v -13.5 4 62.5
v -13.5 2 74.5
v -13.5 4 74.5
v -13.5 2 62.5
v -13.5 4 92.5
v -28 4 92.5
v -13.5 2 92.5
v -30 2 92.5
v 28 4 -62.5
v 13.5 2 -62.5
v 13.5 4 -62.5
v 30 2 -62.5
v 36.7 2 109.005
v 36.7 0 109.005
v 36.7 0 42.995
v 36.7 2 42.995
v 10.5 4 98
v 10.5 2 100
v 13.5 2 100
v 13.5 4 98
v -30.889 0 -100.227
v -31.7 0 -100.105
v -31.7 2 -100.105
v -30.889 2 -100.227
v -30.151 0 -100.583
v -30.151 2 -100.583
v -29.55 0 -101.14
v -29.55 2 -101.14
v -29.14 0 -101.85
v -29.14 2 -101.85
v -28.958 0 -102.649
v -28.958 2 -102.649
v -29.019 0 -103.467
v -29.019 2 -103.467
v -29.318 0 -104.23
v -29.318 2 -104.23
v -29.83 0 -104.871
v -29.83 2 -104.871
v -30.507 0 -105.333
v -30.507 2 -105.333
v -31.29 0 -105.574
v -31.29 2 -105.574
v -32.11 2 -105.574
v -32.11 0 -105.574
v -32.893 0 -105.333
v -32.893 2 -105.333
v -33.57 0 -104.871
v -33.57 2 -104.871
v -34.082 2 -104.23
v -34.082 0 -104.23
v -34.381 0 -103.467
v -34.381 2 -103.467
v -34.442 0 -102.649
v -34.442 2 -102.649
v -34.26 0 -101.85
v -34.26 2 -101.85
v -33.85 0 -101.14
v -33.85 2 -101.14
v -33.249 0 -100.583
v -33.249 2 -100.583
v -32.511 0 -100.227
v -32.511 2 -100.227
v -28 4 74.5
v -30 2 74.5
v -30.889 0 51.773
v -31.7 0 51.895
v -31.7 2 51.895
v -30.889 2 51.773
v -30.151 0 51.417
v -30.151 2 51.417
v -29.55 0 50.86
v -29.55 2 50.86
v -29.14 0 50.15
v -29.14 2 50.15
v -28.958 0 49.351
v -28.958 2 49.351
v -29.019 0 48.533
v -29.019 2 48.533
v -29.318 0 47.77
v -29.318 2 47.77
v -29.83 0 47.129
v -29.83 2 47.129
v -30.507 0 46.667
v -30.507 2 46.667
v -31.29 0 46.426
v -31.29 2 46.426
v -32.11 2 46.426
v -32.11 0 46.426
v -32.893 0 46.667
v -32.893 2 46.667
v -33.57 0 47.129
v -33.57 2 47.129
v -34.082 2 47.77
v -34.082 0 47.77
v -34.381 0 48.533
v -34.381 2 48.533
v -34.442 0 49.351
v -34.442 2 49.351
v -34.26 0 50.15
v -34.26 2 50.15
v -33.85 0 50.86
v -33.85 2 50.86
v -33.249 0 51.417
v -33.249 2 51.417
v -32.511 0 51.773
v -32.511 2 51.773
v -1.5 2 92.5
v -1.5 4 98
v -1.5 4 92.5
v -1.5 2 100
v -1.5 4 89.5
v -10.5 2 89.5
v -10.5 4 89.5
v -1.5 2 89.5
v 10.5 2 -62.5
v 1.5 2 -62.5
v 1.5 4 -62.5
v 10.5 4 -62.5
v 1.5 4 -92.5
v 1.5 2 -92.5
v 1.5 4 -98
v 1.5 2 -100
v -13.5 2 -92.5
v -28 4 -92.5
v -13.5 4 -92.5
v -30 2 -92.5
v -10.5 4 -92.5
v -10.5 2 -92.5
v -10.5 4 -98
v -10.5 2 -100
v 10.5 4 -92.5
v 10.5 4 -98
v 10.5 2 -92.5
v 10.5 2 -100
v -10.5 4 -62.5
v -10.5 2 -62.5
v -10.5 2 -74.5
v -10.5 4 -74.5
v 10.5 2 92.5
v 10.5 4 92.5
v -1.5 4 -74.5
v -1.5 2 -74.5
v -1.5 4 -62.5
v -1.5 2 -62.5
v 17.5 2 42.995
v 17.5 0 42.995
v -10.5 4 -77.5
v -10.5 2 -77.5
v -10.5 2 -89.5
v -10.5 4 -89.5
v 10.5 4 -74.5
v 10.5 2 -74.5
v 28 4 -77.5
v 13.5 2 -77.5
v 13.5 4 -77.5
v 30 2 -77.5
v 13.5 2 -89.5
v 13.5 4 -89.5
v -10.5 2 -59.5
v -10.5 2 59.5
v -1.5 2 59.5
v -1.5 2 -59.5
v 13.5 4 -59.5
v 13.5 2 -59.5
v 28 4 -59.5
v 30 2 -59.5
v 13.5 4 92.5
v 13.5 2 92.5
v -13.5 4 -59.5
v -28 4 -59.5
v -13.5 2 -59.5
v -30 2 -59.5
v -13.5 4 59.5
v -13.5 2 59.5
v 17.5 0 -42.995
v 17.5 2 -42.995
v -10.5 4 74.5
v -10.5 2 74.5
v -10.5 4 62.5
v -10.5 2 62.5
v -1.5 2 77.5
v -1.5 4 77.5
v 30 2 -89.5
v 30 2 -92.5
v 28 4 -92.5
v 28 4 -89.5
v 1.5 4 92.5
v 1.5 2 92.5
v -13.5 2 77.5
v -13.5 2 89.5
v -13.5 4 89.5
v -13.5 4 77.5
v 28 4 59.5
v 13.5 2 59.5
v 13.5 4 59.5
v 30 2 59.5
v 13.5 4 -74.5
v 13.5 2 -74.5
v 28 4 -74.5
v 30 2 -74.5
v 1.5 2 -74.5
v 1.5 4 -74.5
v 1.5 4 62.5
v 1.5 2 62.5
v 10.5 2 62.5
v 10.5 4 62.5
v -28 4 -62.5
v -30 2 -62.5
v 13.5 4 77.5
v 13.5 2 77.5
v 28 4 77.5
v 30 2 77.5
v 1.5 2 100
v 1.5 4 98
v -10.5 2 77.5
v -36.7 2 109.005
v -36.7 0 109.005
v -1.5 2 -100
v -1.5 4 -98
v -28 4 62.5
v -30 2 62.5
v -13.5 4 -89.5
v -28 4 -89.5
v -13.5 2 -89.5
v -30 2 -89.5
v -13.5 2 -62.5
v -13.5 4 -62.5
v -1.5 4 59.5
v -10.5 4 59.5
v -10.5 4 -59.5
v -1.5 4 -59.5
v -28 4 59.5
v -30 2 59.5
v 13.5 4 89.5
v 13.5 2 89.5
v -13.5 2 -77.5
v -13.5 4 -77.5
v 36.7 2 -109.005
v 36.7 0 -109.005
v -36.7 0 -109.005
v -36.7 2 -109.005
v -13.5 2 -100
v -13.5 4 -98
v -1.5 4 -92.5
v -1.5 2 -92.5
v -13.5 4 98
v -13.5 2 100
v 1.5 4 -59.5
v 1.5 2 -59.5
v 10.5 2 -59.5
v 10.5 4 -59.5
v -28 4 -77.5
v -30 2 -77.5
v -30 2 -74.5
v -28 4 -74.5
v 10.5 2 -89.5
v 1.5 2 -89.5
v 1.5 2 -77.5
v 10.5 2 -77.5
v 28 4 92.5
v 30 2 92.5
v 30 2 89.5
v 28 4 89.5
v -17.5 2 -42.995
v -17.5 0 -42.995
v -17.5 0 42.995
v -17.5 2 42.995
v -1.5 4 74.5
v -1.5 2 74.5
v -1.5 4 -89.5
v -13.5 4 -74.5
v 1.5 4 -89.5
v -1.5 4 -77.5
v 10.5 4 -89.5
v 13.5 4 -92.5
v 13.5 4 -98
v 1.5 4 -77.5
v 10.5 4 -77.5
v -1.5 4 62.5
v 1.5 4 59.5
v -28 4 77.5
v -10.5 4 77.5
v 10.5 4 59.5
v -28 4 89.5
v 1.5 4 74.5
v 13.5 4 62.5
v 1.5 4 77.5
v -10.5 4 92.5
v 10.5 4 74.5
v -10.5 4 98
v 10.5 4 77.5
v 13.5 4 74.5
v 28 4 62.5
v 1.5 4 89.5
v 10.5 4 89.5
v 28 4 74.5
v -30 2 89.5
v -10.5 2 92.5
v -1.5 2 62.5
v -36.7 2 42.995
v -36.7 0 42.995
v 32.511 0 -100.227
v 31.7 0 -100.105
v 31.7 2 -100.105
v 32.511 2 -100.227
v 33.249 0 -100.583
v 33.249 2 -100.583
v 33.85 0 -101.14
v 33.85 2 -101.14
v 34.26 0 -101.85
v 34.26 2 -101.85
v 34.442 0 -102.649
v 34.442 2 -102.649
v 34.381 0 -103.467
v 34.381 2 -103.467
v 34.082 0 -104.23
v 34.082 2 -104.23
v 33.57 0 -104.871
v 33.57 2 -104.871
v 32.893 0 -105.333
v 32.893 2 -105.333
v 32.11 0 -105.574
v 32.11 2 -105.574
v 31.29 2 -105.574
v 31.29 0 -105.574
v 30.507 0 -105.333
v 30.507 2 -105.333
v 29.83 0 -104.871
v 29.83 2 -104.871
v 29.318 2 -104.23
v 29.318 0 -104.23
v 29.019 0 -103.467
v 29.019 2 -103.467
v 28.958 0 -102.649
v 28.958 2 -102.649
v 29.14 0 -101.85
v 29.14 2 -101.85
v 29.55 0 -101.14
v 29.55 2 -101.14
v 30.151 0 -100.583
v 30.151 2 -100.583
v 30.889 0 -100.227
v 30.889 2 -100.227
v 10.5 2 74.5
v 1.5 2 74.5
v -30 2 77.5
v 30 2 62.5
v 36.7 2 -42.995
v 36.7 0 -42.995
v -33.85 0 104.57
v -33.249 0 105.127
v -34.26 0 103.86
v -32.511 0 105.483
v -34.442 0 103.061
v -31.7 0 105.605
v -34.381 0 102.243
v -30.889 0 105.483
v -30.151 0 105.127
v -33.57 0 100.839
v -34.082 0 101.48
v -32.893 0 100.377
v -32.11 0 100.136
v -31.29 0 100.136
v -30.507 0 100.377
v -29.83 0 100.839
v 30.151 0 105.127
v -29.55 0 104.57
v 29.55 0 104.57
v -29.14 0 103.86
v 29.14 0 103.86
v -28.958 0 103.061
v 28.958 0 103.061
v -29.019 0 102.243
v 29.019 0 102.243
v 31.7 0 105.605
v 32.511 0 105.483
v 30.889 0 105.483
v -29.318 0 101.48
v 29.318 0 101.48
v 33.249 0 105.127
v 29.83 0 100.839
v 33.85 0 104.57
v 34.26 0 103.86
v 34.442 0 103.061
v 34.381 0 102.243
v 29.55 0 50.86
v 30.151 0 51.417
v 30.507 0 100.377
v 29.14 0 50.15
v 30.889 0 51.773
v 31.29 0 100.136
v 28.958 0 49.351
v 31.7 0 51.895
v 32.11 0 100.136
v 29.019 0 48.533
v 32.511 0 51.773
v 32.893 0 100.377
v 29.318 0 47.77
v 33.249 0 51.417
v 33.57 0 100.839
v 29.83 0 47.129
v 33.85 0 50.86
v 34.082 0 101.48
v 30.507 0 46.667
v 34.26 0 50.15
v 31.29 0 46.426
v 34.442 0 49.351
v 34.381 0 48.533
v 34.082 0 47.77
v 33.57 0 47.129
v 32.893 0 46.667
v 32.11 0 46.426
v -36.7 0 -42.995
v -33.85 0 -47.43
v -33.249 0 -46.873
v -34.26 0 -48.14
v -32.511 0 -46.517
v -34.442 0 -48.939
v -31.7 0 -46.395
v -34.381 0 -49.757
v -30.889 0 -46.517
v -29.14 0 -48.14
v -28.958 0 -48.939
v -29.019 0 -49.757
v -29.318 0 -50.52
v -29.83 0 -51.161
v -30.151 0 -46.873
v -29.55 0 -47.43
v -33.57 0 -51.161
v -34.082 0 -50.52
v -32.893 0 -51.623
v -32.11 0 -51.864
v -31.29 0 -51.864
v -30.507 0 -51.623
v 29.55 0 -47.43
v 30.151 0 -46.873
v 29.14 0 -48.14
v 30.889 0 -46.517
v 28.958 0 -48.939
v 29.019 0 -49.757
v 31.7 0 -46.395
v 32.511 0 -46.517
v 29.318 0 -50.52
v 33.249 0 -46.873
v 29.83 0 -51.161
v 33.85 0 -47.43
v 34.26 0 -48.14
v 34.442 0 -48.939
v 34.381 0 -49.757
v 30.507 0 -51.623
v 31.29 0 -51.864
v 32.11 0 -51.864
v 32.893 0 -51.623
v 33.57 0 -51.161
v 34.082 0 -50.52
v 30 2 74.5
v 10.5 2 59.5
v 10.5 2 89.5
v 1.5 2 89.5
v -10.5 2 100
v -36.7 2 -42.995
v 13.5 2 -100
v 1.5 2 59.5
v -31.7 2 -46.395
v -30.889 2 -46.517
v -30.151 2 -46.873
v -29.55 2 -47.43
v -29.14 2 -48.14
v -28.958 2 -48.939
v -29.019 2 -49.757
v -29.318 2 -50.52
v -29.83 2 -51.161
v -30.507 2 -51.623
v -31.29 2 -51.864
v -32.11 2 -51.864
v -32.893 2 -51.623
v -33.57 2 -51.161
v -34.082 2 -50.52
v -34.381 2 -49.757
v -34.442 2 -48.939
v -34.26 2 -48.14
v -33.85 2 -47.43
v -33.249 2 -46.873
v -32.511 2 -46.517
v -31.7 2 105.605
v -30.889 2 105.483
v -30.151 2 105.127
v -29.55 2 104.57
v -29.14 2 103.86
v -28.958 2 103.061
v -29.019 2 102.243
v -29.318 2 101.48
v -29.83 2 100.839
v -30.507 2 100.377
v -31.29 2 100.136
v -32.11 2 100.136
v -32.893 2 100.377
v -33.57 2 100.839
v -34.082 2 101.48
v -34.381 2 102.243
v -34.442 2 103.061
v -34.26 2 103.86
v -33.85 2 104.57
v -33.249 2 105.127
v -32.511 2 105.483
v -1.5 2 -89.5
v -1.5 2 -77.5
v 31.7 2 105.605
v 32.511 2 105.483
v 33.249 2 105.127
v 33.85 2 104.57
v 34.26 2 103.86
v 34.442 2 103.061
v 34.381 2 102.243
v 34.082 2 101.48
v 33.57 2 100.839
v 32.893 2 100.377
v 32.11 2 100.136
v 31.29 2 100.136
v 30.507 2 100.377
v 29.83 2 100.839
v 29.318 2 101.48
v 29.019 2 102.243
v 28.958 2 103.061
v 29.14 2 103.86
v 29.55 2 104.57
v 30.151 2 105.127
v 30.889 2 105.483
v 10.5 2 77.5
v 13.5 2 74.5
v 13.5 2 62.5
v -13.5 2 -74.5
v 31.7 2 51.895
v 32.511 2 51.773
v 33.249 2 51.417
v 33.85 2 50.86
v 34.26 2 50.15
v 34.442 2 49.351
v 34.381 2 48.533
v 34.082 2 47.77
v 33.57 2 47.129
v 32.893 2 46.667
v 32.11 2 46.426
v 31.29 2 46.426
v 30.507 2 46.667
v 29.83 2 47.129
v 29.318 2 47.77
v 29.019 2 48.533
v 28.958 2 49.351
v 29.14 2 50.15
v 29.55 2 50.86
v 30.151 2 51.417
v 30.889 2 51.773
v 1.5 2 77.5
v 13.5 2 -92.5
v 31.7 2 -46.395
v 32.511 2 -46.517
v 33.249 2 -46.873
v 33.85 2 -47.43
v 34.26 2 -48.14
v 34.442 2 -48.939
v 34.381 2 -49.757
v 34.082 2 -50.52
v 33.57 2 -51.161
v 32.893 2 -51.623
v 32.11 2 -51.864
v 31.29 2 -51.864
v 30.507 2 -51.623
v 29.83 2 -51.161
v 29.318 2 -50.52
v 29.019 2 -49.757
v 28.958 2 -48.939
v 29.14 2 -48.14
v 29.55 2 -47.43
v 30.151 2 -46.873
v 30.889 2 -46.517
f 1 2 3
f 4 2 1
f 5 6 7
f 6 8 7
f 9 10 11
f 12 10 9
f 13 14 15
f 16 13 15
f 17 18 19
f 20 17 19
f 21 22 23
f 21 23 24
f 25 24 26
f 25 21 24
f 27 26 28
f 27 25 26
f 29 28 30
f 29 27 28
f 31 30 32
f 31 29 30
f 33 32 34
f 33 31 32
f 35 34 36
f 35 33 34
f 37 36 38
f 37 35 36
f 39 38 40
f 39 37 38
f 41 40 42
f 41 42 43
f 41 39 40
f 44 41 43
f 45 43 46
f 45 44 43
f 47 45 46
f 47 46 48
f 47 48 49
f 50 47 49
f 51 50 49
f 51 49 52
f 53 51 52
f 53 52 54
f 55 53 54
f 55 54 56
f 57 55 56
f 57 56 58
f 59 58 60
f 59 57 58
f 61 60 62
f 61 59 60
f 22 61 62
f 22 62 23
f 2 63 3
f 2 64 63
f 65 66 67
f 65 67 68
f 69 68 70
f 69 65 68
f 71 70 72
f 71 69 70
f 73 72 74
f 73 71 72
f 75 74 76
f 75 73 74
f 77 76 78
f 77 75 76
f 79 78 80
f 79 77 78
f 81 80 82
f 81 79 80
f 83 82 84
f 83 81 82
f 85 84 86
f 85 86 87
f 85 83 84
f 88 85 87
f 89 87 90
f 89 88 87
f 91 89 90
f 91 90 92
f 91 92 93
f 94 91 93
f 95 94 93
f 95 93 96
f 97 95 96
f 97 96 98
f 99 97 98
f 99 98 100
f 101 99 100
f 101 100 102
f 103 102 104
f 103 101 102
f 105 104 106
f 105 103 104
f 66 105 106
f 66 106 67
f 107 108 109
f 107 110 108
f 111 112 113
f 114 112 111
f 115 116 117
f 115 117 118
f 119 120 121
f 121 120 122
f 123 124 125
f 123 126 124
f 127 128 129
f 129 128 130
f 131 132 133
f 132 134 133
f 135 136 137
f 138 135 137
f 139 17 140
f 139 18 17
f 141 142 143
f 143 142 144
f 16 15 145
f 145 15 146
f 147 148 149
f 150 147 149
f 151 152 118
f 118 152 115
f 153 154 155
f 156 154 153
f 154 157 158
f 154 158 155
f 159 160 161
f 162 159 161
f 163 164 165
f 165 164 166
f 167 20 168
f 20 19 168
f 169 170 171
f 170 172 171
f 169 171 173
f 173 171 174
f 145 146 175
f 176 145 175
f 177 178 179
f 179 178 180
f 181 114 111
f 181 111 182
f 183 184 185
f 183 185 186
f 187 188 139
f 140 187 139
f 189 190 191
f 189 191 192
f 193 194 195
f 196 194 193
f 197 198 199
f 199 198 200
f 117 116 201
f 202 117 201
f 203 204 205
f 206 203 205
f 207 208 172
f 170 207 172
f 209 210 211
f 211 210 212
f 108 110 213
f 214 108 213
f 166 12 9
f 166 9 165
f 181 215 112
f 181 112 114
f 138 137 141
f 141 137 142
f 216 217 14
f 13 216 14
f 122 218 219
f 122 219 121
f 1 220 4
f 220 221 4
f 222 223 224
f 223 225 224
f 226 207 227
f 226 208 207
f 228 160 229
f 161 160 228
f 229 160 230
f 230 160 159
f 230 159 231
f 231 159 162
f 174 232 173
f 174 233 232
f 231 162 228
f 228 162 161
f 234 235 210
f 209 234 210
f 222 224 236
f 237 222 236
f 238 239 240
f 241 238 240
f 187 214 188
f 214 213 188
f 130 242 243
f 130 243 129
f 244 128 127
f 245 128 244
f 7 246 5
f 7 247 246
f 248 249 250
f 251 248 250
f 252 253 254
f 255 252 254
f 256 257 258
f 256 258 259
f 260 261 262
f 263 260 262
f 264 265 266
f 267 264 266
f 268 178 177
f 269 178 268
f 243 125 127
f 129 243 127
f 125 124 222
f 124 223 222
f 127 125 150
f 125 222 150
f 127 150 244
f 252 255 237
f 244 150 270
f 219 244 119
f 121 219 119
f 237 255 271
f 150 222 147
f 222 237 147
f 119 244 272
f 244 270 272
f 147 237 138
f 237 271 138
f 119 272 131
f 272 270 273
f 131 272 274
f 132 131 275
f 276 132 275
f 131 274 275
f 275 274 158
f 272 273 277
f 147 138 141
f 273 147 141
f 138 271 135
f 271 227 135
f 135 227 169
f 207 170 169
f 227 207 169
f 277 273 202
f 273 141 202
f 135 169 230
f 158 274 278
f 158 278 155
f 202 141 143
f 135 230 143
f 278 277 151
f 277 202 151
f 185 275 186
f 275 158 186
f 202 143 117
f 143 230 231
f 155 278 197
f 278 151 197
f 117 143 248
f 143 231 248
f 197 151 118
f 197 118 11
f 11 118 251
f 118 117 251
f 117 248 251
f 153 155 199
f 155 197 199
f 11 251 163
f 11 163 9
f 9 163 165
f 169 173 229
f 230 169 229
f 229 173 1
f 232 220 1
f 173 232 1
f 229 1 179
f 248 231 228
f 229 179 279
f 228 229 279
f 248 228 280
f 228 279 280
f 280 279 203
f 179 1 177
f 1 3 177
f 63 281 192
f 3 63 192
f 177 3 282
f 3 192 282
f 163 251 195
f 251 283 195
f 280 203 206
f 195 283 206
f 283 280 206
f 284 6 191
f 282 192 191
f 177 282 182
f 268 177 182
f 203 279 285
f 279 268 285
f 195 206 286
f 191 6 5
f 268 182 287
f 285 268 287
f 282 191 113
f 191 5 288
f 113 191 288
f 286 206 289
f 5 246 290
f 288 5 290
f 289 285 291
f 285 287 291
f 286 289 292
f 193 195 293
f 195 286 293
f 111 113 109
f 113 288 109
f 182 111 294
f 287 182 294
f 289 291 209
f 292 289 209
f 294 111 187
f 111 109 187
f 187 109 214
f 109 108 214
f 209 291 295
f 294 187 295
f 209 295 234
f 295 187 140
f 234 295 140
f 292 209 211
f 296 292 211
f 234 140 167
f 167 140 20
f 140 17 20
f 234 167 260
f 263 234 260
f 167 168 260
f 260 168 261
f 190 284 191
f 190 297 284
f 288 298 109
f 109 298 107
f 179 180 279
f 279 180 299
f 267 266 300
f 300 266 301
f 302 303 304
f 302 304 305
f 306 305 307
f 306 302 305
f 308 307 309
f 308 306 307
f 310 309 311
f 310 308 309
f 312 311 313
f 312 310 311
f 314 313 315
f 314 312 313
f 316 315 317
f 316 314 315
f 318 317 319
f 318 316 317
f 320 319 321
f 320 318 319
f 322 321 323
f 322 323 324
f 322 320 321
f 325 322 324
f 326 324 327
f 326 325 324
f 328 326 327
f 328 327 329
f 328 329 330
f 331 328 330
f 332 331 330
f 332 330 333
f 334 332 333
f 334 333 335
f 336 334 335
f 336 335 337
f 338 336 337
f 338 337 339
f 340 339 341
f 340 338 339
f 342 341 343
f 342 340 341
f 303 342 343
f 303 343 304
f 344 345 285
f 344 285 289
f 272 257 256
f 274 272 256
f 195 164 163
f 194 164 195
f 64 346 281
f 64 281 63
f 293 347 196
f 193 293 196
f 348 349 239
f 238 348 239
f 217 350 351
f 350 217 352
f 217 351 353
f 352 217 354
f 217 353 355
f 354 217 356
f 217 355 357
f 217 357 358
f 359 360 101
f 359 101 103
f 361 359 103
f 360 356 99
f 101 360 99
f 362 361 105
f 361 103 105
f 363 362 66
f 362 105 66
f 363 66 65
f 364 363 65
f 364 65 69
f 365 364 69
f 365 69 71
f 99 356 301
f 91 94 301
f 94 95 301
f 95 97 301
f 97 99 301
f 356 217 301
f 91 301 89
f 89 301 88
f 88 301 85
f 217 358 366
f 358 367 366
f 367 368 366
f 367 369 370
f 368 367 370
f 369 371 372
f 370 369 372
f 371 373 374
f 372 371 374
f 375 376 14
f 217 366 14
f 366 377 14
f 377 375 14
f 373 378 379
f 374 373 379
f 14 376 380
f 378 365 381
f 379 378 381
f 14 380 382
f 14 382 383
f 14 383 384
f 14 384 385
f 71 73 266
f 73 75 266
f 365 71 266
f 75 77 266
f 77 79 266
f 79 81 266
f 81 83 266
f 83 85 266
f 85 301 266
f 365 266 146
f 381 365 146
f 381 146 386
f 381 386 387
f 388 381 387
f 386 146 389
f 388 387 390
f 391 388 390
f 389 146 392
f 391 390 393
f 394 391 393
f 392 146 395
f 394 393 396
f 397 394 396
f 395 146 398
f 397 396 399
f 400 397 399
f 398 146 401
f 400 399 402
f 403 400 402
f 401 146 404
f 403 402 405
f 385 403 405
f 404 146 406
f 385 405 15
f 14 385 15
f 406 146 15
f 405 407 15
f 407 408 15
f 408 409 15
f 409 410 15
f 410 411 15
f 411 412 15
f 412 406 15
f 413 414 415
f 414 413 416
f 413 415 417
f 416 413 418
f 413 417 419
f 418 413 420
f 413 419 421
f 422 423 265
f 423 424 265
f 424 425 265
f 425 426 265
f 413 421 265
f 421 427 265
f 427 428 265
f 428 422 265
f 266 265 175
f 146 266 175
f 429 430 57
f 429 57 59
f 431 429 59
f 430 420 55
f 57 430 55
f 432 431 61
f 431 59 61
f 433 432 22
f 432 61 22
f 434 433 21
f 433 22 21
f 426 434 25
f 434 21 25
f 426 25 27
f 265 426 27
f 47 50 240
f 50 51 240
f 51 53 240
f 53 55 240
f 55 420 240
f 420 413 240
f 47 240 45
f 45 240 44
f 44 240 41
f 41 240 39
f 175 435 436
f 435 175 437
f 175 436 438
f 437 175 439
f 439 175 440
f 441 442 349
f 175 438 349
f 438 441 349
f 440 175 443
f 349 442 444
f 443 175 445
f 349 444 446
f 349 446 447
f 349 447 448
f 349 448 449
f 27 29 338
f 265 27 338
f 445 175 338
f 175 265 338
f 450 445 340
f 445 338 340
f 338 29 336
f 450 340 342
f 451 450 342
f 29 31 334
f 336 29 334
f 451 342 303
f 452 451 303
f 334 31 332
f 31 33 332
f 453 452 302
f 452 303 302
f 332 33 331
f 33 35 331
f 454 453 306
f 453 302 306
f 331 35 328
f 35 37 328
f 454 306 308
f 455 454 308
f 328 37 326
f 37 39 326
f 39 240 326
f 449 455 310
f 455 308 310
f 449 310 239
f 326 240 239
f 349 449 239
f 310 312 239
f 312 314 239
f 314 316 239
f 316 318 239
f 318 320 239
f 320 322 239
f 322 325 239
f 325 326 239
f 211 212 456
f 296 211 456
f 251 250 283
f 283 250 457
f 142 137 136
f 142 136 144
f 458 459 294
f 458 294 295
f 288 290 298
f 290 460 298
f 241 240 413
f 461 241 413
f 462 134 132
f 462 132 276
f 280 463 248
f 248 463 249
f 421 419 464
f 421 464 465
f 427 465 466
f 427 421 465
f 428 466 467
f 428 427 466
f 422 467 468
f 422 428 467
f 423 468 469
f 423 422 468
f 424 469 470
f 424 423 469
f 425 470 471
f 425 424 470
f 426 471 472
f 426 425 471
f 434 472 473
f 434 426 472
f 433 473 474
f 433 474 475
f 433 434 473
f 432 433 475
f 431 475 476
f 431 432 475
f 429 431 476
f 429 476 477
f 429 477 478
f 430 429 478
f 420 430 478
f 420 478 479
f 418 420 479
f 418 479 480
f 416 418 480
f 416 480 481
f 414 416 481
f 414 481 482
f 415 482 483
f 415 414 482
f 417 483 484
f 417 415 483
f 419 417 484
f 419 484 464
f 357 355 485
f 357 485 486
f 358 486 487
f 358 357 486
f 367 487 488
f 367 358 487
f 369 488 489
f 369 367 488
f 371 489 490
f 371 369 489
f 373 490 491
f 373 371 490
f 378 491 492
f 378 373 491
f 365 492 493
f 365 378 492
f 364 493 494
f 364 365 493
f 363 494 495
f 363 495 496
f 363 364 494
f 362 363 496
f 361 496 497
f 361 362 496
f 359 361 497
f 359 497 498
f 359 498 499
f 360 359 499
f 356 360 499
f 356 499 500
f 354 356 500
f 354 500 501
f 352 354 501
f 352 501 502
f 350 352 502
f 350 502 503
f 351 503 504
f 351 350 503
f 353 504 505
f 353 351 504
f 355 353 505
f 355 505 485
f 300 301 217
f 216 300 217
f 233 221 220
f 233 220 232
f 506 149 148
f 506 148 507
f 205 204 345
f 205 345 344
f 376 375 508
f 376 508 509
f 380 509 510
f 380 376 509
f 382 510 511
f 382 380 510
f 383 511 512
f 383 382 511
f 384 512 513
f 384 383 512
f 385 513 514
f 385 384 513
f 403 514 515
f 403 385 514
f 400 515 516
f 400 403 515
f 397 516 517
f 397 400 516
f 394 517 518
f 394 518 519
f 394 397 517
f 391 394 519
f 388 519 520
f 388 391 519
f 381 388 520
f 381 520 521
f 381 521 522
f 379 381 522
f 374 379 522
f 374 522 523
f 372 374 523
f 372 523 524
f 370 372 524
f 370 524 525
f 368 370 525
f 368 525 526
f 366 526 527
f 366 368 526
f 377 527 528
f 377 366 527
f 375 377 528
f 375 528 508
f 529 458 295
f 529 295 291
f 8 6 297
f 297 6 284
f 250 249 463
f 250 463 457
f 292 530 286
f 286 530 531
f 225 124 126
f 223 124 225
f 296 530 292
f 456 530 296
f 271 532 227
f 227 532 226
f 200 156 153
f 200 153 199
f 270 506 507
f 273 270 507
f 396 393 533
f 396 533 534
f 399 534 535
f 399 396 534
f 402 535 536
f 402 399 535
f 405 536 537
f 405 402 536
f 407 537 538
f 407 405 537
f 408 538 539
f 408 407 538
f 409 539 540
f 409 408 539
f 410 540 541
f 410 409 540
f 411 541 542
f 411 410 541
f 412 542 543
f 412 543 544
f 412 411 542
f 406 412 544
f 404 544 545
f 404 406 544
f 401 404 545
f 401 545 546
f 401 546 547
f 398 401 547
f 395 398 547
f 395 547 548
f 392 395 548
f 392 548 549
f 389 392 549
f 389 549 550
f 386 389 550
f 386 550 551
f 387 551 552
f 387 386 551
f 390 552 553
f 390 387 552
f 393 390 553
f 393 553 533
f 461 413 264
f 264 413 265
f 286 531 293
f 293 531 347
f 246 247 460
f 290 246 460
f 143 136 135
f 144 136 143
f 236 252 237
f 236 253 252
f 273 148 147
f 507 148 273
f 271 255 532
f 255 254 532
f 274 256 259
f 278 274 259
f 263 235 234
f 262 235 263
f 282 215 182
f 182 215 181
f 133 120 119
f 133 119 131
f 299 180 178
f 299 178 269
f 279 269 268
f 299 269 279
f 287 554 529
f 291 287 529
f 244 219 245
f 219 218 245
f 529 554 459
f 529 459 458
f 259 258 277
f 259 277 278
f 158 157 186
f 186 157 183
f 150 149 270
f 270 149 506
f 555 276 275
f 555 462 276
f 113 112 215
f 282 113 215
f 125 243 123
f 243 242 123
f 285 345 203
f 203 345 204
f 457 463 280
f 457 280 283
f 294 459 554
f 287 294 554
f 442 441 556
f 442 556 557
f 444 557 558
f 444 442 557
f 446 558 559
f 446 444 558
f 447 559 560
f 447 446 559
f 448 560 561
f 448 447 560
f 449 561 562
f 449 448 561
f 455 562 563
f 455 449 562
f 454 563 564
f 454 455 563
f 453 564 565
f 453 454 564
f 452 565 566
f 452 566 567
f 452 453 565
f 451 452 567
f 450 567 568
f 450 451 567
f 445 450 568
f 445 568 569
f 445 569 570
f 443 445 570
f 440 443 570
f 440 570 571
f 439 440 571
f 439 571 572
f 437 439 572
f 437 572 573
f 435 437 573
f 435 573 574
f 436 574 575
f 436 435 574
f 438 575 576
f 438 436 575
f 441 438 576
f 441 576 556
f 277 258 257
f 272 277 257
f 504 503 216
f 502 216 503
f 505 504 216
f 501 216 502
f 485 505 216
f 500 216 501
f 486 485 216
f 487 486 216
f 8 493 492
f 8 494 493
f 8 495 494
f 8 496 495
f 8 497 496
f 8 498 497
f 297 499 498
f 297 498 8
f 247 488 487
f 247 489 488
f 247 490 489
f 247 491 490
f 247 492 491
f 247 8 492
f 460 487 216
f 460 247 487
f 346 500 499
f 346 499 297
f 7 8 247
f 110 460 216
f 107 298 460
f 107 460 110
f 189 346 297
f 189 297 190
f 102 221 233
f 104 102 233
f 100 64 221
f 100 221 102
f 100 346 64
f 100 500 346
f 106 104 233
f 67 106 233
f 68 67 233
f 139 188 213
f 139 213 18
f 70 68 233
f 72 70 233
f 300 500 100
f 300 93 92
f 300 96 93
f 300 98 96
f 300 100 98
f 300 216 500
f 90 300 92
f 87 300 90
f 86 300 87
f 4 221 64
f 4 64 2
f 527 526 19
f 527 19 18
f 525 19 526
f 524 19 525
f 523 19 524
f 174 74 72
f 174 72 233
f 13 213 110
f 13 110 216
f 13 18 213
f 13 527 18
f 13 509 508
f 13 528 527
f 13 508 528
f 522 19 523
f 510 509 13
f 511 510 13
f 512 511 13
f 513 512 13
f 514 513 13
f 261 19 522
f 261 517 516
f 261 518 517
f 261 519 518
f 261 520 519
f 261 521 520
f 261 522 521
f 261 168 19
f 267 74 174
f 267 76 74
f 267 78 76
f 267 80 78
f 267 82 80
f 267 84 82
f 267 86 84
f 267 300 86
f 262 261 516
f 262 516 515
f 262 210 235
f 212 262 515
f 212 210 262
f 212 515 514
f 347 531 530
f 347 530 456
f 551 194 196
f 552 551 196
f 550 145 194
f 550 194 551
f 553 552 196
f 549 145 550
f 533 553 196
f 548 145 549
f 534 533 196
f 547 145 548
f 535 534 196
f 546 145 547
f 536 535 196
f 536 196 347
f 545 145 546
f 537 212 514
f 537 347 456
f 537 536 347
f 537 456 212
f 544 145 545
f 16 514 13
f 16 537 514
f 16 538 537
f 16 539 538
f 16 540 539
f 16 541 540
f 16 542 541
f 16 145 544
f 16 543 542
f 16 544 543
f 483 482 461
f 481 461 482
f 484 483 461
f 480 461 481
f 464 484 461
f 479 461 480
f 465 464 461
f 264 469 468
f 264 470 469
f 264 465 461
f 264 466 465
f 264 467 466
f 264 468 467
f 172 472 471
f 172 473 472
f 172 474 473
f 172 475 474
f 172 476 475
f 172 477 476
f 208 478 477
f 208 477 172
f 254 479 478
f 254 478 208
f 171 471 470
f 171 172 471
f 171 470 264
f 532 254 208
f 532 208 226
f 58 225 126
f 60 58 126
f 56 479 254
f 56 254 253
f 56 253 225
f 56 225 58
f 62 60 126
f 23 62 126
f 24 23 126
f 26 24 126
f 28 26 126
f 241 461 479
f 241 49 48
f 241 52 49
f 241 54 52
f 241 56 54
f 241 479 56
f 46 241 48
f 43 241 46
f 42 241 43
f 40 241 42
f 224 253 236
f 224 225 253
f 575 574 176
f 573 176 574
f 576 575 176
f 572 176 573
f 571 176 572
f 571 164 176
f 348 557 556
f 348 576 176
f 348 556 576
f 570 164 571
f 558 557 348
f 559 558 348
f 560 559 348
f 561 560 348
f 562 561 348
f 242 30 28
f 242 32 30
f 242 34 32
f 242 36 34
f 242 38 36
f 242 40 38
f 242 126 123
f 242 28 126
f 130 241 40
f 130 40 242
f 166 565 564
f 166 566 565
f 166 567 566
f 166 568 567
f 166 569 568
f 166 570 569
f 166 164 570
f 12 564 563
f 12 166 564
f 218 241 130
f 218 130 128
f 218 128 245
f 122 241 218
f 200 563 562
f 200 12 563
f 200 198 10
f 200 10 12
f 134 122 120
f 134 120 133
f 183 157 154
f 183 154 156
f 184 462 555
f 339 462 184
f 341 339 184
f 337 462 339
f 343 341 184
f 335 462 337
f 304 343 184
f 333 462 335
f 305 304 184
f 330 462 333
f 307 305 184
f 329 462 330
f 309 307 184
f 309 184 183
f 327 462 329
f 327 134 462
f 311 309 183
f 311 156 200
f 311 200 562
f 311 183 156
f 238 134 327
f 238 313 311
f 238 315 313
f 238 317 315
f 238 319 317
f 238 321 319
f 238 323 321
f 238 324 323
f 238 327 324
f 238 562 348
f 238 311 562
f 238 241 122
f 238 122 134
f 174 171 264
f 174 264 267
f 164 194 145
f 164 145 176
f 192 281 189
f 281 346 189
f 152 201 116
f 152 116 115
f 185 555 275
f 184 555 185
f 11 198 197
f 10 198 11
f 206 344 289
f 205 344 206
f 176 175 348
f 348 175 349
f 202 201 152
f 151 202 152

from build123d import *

# Parameters (mm, degrees)
SKETCH1_R                = 2.75
BOSS_EXTRUDE1_DEPTH      = 2
SKETCH2_W                = 3
SKETCH2_H                = 100
BOSS_EXTRUDE2_DEPTH      = 2
SKETCH3_W                = 60
SKETCH3_H                = 3
BOSS_EXTRUDE3_DEPTH      = 2
CHAMFER1_SIZE            = 2
CHAMFER1_OF_MIRROR1_SIZE = 2


with BuildPart() as part:
    # Sketch1 → Boss-Extrude1 (new body)
    with BuildSketch(Plane(origin=(0, 0, 0), x_dir=(1, 0, 0), z_dir=(0, 1, 0))):
        Polygon((-17.5, 42.995), (-17.5, -42.995), (-36.7, -42.995), (-36.7, -109.005), (36.7, -109.005), (36.7, -42.995), (17.5, -42.995), (17.5, 42.995), (36.7, 42.995), (36.7, 109.005), (-36.7, 109.005), (-36.7, 42.995), align=None)
        with Locations(Location((-31.7, 102.855, 0), (0, 0, 270))):
            Circle(SKETCH1_R, mode=Mode.SUBTRACT)
        with Locations(Location((-31.7, 49.145, 0), (0, 0, 270))):
            Circle(SKETCH1_R, mode=Mode.SUBTRACT)
        with Locations(Location((31.7, 49.145, 0), (0, 0, 270))):
            Circle(SKETCH1_R, mode=Mode.SUBTRACT)
        with Locations(Location((31.7, 102.855, 0), (0, 0, 270))):
            Circle(SKETCH1_R, mode=Mode.SUBTRACT)
        with Locations(Location((31.7, -102.855, 0), (0, 0, 270))):
            Circle(SKETCH1_R, mode=Mode.SUBTRACT)
        with Locations(Location((31.7, -49.145, 0), (0, 0, 270))):
            Circle(SKETCH1_R, mode=Mode.SUBTRACT)
        with Locations(Location((-31.7, -49.145, 0), (0, 0, 270))):
            Circle(SKETCH1_R, mode=Mode.SUBTRACT)
        with Locations(Location((-31.7, -102.855, 0), (0, 0, 270))):
            Circle(SKETCH1_R, mode=Mode.SUBTRACT)
    extrude(amount=BOSS_EXTRUDE1_DEPTH)

    # Sketch2 → Boss-Extrude2 (add)
    with BuildSketch(Plane(origin=(0, 2, 0), x_dir=(1, 0, 0), z_dir=(0, 1, 0))):
        with Locations((12, -50)):
            Rectangle(SKETCH2_W, SKETCH2_H)
        with Locations((0, -50)):
            Rectangle(SKETCH2_W, SKETCH2_H)
        with Locations((-12, -50)):
            Rectangle(SKETCH2_W, SKETCH2_H)
    boss_extrude2 = extrude(amount=BOSS_EXTRUDE2_DEPTH)

    # Sketch3 → Boss-Extrude3 (add)
    with BuildSketch(Plane(origin=(0, 2, 0), x_dir=(1, 0, 0), z_dir=(0, 1, 0))):
        with Locations((0, -91)):
            Rectangle(SKETCH3_W, SKETCH3_H)
        with Locations((0, -61)):
            Rectangle(SKETCH3_W, SKETCH3_H)
        with Locations((0, -76)):
            Rectangle(SKETCH3_W, SKETCH3_H)
    boss_extrude3 = extrude(amount=BOSS_EXTRUDE3_DEPTH)

    # Chamfer1
    chamfer1_edges = [part.edges().sort_by_distance(p)[0] for p in [
        (30, 4, 61),
        (30, 4, 76),
        (30, 4, 91),
        (12, 4, 100),
        (0, 4, 100),
        (-12, 4, 100),
        (-30, 4, 91),
        (-30, 4, 76),
        (-30, 4, 61),
    ]]
    chamfer(chamfer1_edges, length=CHAMFER1_SIZE - 0.0001)  # a hair under: the kernel refuses the full size

    # Mirror1: Boss-Extrude2, Boss-Extrude3 across plane
    add(boss_extrude2.mirror(Plane.XY))
    add(boss_extrude3.mirror(Plane.XY))

    # Chamfer1 of Mirror1
    chamfer1_of_mirror1_edges = [part.edges().sort_by_distance(p)[0] for p in [
        (30, 4, -61),
        (30, 4, -76),
        (30, 4, -91),
        (12, 4, -100),
        (0, 4, -100),
        (-12, 4, -100),
        (-30, 4, -91),
        (-30, 4, -76),
        (-30, 4, -61),
    ]]
    chamfer(chamfer1_of_mirror1_edges, length=CHAMFER1_OF_MIRROR1_SIZE - 0.0001)  # a hair under: the kernel refuses the full size


solid = part.part
